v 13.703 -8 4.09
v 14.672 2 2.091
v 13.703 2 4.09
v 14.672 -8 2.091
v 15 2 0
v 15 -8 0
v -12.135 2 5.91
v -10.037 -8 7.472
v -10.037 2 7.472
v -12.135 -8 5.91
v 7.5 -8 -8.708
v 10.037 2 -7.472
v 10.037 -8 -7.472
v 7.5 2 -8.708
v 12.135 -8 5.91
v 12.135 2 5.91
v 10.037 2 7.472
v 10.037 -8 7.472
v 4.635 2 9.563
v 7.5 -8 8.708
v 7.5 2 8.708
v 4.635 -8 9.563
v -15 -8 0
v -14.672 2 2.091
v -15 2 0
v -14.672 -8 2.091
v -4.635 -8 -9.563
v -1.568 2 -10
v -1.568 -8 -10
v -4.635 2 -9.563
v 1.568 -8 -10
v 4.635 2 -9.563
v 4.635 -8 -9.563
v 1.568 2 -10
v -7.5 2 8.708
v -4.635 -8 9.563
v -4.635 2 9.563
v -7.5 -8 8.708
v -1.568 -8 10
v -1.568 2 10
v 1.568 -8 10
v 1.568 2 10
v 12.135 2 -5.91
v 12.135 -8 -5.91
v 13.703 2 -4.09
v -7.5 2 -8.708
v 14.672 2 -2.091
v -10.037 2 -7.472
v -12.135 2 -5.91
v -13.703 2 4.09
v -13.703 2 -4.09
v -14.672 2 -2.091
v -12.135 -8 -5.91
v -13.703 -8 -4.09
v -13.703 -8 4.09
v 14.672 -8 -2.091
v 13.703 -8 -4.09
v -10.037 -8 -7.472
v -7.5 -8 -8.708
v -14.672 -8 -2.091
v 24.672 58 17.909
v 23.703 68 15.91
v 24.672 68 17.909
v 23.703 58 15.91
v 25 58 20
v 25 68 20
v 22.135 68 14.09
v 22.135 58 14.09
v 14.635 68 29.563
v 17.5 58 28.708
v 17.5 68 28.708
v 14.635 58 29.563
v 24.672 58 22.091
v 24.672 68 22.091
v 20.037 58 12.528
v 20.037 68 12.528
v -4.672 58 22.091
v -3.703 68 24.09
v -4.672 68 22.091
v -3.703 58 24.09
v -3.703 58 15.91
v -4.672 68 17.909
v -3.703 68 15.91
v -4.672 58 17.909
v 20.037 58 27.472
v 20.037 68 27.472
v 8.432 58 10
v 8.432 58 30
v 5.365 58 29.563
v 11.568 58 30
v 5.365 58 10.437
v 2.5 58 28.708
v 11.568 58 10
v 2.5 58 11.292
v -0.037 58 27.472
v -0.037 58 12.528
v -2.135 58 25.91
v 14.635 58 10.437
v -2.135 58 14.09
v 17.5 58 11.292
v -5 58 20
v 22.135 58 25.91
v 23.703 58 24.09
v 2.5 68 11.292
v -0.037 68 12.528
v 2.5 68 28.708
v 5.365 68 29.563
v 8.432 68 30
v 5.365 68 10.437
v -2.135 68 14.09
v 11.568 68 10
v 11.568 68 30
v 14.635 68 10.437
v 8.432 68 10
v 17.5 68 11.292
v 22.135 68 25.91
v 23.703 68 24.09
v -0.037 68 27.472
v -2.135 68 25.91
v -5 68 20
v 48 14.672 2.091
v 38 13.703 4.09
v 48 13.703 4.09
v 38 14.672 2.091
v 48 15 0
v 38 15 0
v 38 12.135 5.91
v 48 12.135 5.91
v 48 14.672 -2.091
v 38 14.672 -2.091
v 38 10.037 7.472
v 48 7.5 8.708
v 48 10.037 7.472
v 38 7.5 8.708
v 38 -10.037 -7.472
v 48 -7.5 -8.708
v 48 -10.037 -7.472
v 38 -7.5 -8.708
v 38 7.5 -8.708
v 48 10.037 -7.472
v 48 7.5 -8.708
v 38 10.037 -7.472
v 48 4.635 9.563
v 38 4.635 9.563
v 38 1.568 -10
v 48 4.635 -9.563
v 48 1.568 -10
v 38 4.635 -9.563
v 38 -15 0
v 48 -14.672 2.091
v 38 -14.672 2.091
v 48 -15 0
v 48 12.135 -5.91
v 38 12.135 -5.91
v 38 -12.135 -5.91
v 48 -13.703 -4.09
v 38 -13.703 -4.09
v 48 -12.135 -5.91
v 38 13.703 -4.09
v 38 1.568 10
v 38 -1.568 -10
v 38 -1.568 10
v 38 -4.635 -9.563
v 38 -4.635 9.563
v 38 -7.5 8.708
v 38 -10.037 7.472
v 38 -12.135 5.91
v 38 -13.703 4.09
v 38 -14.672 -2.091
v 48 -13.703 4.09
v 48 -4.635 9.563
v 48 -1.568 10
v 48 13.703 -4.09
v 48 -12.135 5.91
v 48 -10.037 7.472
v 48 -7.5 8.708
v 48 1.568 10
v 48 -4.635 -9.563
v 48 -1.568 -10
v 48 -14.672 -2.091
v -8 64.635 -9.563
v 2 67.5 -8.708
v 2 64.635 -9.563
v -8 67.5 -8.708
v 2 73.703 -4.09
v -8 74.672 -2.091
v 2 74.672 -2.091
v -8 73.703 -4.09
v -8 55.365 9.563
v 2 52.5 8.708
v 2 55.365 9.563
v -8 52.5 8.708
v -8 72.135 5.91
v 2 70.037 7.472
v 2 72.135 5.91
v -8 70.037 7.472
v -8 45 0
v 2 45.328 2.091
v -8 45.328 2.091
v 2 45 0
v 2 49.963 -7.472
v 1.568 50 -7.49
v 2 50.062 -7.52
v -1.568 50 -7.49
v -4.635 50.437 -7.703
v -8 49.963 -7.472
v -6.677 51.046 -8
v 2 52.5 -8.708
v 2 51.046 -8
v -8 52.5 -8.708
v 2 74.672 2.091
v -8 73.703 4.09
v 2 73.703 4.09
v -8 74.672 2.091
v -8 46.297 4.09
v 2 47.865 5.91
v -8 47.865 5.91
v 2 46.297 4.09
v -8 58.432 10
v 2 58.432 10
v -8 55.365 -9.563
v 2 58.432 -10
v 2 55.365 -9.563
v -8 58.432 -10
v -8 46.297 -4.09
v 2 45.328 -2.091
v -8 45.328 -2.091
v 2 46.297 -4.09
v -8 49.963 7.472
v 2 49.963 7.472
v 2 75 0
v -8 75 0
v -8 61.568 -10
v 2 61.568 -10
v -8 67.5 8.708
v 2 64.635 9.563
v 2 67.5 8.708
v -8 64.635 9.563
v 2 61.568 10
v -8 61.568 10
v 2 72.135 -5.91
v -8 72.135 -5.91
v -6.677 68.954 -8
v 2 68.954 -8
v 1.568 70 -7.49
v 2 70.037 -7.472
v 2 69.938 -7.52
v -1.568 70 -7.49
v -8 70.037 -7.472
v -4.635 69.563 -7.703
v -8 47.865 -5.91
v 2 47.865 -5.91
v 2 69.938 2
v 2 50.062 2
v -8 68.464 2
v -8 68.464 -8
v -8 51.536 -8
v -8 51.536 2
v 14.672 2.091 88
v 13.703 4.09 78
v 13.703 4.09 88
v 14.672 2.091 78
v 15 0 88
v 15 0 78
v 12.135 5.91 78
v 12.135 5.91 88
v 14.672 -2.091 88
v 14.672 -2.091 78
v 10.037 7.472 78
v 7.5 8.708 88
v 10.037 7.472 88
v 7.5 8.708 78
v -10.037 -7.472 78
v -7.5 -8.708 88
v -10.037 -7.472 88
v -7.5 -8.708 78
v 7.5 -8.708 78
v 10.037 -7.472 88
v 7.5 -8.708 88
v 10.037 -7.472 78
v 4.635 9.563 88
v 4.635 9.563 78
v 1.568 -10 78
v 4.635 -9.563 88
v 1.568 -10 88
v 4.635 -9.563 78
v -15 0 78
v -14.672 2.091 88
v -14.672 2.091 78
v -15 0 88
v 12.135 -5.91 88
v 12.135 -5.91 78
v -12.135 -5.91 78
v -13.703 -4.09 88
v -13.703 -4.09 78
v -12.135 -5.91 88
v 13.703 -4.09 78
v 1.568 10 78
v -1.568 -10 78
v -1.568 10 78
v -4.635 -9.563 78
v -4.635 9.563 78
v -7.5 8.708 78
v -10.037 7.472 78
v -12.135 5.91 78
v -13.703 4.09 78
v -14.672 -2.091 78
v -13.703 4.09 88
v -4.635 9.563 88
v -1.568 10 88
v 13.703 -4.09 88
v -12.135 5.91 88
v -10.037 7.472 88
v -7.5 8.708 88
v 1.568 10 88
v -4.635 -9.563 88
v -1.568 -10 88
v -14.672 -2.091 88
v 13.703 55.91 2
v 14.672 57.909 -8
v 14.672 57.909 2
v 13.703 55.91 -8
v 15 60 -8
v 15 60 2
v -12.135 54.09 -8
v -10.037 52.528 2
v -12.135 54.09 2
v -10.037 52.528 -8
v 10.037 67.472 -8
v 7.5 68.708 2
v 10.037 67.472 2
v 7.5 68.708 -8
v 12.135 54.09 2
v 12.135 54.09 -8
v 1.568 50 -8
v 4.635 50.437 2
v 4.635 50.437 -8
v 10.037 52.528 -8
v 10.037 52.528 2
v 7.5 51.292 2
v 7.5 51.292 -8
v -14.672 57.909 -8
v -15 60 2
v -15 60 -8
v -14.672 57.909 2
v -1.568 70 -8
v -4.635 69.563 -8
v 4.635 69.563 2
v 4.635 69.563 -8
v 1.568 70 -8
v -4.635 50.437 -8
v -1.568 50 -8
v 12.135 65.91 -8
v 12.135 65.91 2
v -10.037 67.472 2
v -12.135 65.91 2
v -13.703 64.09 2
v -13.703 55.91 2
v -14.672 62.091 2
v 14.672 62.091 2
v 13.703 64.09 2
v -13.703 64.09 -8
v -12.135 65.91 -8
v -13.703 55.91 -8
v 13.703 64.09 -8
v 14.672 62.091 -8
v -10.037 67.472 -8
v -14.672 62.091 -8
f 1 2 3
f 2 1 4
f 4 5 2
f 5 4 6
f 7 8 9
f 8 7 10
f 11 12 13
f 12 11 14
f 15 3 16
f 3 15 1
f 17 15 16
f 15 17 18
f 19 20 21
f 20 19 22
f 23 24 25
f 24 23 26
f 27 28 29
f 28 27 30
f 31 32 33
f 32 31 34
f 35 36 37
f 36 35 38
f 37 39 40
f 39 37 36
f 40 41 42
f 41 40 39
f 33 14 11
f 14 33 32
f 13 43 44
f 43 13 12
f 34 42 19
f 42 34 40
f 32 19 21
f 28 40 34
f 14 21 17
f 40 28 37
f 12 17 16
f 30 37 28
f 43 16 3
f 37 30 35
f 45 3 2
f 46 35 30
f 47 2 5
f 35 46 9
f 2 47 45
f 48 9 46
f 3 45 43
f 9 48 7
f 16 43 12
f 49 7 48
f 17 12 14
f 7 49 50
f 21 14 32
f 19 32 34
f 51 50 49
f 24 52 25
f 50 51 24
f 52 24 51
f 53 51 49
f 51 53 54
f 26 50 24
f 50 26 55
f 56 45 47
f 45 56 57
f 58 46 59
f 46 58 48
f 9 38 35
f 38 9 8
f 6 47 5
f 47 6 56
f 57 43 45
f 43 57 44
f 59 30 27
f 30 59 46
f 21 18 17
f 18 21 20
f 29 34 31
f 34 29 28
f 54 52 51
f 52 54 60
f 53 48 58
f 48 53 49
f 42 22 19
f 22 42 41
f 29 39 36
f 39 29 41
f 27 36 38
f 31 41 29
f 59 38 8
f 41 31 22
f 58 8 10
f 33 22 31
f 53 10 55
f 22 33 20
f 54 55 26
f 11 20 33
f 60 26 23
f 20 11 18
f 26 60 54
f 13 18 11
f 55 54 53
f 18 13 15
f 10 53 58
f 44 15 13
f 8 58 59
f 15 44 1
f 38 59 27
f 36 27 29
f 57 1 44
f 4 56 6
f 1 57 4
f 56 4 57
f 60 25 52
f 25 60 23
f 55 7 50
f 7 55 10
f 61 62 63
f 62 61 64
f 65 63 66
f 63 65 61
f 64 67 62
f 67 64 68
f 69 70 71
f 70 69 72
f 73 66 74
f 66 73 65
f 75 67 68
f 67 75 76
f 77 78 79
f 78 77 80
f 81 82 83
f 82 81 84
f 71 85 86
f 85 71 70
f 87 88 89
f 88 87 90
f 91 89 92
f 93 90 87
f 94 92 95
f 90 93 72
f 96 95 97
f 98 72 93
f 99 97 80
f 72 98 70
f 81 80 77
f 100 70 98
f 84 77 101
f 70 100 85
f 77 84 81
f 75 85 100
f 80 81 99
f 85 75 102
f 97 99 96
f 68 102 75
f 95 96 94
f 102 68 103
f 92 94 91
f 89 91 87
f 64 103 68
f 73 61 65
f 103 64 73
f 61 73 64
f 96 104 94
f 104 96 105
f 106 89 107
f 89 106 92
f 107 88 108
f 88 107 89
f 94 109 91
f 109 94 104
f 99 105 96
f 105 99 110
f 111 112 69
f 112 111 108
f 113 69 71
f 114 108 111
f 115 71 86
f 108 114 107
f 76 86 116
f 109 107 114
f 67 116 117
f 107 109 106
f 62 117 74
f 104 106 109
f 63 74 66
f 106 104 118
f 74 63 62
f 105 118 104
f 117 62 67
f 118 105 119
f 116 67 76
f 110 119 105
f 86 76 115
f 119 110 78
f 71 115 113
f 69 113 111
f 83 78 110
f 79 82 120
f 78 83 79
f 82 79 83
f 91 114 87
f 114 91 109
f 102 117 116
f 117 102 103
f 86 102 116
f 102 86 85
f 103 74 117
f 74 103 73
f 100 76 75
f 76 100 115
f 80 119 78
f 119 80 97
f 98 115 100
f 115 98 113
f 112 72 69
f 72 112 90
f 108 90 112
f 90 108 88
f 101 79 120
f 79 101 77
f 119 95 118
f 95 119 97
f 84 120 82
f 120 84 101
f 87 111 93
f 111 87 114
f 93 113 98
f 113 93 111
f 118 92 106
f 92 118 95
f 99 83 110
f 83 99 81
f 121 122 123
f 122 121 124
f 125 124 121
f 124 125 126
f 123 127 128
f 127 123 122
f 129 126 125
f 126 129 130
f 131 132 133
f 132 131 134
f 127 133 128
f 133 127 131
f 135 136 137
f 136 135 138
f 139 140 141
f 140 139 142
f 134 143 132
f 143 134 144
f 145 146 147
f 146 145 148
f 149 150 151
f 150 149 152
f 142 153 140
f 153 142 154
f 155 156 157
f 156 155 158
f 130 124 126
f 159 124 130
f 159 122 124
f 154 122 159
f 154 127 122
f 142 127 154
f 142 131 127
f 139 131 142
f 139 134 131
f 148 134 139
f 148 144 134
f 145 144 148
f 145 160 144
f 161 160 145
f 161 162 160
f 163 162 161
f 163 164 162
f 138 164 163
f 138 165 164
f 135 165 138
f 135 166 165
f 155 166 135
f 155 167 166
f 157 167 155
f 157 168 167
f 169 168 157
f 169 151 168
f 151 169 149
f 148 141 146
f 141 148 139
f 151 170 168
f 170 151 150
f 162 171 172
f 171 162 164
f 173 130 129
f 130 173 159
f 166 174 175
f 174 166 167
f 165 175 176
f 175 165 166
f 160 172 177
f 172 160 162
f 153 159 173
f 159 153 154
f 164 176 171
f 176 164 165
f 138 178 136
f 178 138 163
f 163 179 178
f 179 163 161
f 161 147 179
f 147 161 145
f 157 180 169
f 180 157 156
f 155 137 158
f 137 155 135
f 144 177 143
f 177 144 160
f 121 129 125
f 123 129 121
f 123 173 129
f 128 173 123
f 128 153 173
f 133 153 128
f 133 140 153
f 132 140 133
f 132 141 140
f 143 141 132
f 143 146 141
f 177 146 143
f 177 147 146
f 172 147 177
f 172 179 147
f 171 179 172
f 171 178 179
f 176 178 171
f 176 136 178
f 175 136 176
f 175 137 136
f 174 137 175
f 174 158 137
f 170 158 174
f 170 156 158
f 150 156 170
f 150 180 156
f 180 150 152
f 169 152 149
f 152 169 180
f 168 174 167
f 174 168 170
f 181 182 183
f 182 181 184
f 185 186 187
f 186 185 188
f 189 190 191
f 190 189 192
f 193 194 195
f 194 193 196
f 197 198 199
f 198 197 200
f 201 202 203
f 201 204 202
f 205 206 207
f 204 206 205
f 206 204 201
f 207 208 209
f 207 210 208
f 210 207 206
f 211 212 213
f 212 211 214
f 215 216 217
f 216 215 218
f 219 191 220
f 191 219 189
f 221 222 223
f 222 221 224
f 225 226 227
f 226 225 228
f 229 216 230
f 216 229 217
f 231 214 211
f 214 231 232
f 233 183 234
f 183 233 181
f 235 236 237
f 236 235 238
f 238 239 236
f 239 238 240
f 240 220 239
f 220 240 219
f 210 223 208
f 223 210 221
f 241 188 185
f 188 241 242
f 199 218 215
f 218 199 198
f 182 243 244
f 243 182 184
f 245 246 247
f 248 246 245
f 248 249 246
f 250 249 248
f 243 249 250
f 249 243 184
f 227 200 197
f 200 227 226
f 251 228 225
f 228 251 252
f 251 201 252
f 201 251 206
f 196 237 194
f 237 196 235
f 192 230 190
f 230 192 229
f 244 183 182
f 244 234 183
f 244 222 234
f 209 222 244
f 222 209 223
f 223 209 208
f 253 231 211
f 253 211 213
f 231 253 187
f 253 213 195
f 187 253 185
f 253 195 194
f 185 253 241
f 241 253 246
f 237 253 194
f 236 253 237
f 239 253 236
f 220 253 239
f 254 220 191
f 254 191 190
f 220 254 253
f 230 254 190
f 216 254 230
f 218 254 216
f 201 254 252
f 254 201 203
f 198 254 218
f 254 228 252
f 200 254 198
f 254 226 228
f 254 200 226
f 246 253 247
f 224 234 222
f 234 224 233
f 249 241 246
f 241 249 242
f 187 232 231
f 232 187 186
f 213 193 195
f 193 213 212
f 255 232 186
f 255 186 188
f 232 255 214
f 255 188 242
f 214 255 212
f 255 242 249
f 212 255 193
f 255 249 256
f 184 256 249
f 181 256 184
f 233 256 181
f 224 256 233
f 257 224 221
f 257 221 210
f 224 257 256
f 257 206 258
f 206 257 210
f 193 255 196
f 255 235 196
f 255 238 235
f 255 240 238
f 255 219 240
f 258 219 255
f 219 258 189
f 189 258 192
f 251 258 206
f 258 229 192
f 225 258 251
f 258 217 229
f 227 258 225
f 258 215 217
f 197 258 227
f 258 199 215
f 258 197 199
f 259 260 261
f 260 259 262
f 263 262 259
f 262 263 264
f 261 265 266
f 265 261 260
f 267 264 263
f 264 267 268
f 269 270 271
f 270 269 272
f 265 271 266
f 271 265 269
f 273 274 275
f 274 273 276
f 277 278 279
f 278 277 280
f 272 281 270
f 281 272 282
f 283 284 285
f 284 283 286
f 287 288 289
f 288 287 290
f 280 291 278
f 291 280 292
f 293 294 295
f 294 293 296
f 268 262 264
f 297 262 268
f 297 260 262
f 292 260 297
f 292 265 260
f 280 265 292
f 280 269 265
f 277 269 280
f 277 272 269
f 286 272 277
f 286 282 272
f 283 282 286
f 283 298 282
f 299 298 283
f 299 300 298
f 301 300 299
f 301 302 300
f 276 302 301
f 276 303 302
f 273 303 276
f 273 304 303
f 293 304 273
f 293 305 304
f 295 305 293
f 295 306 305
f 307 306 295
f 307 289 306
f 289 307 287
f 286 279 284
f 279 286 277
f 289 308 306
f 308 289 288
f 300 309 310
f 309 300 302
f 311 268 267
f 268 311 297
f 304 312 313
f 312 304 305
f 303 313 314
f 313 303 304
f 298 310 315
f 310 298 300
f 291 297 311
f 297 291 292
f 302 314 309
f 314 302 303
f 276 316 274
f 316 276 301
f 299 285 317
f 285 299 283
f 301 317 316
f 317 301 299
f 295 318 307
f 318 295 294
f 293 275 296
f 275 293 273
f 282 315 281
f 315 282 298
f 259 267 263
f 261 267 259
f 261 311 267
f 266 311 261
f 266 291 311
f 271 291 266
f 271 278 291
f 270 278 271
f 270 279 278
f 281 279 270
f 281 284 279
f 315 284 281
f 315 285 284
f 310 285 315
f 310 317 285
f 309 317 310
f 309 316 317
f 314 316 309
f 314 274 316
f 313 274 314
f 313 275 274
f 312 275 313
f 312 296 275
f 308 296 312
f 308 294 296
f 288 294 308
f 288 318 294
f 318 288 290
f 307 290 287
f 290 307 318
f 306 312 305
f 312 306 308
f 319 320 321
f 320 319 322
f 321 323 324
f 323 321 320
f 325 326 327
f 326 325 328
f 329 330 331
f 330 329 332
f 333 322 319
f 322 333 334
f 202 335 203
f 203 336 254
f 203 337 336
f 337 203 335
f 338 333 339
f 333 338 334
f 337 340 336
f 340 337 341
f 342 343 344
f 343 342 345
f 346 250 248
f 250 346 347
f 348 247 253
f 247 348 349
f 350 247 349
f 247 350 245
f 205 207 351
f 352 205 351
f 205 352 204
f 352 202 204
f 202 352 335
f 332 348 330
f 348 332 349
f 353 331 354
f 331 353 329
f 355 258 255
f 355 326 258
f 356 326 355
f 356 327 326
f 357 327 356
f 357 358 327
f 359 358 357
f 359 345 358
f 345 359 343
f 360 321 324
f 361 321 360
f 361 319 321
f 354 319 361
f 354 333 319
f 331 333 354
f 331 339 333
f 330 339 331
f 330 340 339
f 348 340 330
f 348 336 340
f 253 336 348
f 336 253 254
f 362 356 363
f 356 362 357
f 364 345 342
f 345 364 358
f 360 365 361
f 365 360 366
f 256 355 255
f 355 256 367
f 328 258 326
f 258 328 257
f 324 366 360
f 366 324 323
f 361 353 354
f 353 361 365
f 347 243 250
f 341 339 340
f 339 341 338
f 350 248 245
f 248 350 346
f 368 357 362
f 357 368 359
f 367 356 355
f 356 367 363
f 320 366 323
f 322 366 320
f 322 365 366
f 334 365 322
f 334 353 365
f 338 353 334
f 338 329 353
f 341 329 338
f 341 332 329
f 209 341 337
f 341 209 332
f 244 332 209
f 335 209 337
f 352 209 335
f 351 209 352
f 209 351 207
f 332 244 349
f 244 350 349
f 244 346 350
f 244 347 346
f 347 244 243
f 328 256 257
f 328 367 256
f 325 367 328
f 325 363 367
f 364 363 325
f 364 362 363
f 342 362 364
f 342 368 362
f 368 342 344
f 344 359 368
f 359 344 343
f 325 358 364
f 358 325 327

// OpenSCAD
dim=[40,60,80];
loc=[10,20];
w=2;
x=30;
y=20;
z=10;
shape="round";

%cube(dim);

translate([x/2,0,y/2]){ // move to zero
    //front
    rotate([90,0,0])
        translate([0,0,+z/2-w]) // move into wall
            mkshape(shape);

    //back
    translate([dim[0]-x,0,0])
    rotate([270,0,0])
        translate([0,0,+z/2-w+dim[1]])
            mkshape(shape);
}


translate([0,x/2,y/2]){            
    //right
    rotate([90,0,90])
        translate([0,0,+z/2-w+dim[0]])
            mkshape(shape);
    
    //left
    translate([0,dim[1]-x,0])
    rotate([90,0,270])
        translate([0,0,+z/2-w])
            mkshape(shape);
}

translate([x/2,y/2,0]){            
    //top
    rotate([0,0,0])
        translate([0,0,+z/2-w+dim[2]])
            mkshape(shape);
    
    //bottom
    translate([0,dim[1]-y,0])
    rotate([180,0,0])
        translate([0,0,+z/2-w])
            mkshape(shape);
}

module mkshape(shape){
    if(shape=="square"){
        cube([x,y,z],center=true);
    }
    if(shape=="round"){
        translate([-x/2,-y/2,0])
        resize([0,y,0])
            cylinder(d=x,h=z,center=true);
    }
}
